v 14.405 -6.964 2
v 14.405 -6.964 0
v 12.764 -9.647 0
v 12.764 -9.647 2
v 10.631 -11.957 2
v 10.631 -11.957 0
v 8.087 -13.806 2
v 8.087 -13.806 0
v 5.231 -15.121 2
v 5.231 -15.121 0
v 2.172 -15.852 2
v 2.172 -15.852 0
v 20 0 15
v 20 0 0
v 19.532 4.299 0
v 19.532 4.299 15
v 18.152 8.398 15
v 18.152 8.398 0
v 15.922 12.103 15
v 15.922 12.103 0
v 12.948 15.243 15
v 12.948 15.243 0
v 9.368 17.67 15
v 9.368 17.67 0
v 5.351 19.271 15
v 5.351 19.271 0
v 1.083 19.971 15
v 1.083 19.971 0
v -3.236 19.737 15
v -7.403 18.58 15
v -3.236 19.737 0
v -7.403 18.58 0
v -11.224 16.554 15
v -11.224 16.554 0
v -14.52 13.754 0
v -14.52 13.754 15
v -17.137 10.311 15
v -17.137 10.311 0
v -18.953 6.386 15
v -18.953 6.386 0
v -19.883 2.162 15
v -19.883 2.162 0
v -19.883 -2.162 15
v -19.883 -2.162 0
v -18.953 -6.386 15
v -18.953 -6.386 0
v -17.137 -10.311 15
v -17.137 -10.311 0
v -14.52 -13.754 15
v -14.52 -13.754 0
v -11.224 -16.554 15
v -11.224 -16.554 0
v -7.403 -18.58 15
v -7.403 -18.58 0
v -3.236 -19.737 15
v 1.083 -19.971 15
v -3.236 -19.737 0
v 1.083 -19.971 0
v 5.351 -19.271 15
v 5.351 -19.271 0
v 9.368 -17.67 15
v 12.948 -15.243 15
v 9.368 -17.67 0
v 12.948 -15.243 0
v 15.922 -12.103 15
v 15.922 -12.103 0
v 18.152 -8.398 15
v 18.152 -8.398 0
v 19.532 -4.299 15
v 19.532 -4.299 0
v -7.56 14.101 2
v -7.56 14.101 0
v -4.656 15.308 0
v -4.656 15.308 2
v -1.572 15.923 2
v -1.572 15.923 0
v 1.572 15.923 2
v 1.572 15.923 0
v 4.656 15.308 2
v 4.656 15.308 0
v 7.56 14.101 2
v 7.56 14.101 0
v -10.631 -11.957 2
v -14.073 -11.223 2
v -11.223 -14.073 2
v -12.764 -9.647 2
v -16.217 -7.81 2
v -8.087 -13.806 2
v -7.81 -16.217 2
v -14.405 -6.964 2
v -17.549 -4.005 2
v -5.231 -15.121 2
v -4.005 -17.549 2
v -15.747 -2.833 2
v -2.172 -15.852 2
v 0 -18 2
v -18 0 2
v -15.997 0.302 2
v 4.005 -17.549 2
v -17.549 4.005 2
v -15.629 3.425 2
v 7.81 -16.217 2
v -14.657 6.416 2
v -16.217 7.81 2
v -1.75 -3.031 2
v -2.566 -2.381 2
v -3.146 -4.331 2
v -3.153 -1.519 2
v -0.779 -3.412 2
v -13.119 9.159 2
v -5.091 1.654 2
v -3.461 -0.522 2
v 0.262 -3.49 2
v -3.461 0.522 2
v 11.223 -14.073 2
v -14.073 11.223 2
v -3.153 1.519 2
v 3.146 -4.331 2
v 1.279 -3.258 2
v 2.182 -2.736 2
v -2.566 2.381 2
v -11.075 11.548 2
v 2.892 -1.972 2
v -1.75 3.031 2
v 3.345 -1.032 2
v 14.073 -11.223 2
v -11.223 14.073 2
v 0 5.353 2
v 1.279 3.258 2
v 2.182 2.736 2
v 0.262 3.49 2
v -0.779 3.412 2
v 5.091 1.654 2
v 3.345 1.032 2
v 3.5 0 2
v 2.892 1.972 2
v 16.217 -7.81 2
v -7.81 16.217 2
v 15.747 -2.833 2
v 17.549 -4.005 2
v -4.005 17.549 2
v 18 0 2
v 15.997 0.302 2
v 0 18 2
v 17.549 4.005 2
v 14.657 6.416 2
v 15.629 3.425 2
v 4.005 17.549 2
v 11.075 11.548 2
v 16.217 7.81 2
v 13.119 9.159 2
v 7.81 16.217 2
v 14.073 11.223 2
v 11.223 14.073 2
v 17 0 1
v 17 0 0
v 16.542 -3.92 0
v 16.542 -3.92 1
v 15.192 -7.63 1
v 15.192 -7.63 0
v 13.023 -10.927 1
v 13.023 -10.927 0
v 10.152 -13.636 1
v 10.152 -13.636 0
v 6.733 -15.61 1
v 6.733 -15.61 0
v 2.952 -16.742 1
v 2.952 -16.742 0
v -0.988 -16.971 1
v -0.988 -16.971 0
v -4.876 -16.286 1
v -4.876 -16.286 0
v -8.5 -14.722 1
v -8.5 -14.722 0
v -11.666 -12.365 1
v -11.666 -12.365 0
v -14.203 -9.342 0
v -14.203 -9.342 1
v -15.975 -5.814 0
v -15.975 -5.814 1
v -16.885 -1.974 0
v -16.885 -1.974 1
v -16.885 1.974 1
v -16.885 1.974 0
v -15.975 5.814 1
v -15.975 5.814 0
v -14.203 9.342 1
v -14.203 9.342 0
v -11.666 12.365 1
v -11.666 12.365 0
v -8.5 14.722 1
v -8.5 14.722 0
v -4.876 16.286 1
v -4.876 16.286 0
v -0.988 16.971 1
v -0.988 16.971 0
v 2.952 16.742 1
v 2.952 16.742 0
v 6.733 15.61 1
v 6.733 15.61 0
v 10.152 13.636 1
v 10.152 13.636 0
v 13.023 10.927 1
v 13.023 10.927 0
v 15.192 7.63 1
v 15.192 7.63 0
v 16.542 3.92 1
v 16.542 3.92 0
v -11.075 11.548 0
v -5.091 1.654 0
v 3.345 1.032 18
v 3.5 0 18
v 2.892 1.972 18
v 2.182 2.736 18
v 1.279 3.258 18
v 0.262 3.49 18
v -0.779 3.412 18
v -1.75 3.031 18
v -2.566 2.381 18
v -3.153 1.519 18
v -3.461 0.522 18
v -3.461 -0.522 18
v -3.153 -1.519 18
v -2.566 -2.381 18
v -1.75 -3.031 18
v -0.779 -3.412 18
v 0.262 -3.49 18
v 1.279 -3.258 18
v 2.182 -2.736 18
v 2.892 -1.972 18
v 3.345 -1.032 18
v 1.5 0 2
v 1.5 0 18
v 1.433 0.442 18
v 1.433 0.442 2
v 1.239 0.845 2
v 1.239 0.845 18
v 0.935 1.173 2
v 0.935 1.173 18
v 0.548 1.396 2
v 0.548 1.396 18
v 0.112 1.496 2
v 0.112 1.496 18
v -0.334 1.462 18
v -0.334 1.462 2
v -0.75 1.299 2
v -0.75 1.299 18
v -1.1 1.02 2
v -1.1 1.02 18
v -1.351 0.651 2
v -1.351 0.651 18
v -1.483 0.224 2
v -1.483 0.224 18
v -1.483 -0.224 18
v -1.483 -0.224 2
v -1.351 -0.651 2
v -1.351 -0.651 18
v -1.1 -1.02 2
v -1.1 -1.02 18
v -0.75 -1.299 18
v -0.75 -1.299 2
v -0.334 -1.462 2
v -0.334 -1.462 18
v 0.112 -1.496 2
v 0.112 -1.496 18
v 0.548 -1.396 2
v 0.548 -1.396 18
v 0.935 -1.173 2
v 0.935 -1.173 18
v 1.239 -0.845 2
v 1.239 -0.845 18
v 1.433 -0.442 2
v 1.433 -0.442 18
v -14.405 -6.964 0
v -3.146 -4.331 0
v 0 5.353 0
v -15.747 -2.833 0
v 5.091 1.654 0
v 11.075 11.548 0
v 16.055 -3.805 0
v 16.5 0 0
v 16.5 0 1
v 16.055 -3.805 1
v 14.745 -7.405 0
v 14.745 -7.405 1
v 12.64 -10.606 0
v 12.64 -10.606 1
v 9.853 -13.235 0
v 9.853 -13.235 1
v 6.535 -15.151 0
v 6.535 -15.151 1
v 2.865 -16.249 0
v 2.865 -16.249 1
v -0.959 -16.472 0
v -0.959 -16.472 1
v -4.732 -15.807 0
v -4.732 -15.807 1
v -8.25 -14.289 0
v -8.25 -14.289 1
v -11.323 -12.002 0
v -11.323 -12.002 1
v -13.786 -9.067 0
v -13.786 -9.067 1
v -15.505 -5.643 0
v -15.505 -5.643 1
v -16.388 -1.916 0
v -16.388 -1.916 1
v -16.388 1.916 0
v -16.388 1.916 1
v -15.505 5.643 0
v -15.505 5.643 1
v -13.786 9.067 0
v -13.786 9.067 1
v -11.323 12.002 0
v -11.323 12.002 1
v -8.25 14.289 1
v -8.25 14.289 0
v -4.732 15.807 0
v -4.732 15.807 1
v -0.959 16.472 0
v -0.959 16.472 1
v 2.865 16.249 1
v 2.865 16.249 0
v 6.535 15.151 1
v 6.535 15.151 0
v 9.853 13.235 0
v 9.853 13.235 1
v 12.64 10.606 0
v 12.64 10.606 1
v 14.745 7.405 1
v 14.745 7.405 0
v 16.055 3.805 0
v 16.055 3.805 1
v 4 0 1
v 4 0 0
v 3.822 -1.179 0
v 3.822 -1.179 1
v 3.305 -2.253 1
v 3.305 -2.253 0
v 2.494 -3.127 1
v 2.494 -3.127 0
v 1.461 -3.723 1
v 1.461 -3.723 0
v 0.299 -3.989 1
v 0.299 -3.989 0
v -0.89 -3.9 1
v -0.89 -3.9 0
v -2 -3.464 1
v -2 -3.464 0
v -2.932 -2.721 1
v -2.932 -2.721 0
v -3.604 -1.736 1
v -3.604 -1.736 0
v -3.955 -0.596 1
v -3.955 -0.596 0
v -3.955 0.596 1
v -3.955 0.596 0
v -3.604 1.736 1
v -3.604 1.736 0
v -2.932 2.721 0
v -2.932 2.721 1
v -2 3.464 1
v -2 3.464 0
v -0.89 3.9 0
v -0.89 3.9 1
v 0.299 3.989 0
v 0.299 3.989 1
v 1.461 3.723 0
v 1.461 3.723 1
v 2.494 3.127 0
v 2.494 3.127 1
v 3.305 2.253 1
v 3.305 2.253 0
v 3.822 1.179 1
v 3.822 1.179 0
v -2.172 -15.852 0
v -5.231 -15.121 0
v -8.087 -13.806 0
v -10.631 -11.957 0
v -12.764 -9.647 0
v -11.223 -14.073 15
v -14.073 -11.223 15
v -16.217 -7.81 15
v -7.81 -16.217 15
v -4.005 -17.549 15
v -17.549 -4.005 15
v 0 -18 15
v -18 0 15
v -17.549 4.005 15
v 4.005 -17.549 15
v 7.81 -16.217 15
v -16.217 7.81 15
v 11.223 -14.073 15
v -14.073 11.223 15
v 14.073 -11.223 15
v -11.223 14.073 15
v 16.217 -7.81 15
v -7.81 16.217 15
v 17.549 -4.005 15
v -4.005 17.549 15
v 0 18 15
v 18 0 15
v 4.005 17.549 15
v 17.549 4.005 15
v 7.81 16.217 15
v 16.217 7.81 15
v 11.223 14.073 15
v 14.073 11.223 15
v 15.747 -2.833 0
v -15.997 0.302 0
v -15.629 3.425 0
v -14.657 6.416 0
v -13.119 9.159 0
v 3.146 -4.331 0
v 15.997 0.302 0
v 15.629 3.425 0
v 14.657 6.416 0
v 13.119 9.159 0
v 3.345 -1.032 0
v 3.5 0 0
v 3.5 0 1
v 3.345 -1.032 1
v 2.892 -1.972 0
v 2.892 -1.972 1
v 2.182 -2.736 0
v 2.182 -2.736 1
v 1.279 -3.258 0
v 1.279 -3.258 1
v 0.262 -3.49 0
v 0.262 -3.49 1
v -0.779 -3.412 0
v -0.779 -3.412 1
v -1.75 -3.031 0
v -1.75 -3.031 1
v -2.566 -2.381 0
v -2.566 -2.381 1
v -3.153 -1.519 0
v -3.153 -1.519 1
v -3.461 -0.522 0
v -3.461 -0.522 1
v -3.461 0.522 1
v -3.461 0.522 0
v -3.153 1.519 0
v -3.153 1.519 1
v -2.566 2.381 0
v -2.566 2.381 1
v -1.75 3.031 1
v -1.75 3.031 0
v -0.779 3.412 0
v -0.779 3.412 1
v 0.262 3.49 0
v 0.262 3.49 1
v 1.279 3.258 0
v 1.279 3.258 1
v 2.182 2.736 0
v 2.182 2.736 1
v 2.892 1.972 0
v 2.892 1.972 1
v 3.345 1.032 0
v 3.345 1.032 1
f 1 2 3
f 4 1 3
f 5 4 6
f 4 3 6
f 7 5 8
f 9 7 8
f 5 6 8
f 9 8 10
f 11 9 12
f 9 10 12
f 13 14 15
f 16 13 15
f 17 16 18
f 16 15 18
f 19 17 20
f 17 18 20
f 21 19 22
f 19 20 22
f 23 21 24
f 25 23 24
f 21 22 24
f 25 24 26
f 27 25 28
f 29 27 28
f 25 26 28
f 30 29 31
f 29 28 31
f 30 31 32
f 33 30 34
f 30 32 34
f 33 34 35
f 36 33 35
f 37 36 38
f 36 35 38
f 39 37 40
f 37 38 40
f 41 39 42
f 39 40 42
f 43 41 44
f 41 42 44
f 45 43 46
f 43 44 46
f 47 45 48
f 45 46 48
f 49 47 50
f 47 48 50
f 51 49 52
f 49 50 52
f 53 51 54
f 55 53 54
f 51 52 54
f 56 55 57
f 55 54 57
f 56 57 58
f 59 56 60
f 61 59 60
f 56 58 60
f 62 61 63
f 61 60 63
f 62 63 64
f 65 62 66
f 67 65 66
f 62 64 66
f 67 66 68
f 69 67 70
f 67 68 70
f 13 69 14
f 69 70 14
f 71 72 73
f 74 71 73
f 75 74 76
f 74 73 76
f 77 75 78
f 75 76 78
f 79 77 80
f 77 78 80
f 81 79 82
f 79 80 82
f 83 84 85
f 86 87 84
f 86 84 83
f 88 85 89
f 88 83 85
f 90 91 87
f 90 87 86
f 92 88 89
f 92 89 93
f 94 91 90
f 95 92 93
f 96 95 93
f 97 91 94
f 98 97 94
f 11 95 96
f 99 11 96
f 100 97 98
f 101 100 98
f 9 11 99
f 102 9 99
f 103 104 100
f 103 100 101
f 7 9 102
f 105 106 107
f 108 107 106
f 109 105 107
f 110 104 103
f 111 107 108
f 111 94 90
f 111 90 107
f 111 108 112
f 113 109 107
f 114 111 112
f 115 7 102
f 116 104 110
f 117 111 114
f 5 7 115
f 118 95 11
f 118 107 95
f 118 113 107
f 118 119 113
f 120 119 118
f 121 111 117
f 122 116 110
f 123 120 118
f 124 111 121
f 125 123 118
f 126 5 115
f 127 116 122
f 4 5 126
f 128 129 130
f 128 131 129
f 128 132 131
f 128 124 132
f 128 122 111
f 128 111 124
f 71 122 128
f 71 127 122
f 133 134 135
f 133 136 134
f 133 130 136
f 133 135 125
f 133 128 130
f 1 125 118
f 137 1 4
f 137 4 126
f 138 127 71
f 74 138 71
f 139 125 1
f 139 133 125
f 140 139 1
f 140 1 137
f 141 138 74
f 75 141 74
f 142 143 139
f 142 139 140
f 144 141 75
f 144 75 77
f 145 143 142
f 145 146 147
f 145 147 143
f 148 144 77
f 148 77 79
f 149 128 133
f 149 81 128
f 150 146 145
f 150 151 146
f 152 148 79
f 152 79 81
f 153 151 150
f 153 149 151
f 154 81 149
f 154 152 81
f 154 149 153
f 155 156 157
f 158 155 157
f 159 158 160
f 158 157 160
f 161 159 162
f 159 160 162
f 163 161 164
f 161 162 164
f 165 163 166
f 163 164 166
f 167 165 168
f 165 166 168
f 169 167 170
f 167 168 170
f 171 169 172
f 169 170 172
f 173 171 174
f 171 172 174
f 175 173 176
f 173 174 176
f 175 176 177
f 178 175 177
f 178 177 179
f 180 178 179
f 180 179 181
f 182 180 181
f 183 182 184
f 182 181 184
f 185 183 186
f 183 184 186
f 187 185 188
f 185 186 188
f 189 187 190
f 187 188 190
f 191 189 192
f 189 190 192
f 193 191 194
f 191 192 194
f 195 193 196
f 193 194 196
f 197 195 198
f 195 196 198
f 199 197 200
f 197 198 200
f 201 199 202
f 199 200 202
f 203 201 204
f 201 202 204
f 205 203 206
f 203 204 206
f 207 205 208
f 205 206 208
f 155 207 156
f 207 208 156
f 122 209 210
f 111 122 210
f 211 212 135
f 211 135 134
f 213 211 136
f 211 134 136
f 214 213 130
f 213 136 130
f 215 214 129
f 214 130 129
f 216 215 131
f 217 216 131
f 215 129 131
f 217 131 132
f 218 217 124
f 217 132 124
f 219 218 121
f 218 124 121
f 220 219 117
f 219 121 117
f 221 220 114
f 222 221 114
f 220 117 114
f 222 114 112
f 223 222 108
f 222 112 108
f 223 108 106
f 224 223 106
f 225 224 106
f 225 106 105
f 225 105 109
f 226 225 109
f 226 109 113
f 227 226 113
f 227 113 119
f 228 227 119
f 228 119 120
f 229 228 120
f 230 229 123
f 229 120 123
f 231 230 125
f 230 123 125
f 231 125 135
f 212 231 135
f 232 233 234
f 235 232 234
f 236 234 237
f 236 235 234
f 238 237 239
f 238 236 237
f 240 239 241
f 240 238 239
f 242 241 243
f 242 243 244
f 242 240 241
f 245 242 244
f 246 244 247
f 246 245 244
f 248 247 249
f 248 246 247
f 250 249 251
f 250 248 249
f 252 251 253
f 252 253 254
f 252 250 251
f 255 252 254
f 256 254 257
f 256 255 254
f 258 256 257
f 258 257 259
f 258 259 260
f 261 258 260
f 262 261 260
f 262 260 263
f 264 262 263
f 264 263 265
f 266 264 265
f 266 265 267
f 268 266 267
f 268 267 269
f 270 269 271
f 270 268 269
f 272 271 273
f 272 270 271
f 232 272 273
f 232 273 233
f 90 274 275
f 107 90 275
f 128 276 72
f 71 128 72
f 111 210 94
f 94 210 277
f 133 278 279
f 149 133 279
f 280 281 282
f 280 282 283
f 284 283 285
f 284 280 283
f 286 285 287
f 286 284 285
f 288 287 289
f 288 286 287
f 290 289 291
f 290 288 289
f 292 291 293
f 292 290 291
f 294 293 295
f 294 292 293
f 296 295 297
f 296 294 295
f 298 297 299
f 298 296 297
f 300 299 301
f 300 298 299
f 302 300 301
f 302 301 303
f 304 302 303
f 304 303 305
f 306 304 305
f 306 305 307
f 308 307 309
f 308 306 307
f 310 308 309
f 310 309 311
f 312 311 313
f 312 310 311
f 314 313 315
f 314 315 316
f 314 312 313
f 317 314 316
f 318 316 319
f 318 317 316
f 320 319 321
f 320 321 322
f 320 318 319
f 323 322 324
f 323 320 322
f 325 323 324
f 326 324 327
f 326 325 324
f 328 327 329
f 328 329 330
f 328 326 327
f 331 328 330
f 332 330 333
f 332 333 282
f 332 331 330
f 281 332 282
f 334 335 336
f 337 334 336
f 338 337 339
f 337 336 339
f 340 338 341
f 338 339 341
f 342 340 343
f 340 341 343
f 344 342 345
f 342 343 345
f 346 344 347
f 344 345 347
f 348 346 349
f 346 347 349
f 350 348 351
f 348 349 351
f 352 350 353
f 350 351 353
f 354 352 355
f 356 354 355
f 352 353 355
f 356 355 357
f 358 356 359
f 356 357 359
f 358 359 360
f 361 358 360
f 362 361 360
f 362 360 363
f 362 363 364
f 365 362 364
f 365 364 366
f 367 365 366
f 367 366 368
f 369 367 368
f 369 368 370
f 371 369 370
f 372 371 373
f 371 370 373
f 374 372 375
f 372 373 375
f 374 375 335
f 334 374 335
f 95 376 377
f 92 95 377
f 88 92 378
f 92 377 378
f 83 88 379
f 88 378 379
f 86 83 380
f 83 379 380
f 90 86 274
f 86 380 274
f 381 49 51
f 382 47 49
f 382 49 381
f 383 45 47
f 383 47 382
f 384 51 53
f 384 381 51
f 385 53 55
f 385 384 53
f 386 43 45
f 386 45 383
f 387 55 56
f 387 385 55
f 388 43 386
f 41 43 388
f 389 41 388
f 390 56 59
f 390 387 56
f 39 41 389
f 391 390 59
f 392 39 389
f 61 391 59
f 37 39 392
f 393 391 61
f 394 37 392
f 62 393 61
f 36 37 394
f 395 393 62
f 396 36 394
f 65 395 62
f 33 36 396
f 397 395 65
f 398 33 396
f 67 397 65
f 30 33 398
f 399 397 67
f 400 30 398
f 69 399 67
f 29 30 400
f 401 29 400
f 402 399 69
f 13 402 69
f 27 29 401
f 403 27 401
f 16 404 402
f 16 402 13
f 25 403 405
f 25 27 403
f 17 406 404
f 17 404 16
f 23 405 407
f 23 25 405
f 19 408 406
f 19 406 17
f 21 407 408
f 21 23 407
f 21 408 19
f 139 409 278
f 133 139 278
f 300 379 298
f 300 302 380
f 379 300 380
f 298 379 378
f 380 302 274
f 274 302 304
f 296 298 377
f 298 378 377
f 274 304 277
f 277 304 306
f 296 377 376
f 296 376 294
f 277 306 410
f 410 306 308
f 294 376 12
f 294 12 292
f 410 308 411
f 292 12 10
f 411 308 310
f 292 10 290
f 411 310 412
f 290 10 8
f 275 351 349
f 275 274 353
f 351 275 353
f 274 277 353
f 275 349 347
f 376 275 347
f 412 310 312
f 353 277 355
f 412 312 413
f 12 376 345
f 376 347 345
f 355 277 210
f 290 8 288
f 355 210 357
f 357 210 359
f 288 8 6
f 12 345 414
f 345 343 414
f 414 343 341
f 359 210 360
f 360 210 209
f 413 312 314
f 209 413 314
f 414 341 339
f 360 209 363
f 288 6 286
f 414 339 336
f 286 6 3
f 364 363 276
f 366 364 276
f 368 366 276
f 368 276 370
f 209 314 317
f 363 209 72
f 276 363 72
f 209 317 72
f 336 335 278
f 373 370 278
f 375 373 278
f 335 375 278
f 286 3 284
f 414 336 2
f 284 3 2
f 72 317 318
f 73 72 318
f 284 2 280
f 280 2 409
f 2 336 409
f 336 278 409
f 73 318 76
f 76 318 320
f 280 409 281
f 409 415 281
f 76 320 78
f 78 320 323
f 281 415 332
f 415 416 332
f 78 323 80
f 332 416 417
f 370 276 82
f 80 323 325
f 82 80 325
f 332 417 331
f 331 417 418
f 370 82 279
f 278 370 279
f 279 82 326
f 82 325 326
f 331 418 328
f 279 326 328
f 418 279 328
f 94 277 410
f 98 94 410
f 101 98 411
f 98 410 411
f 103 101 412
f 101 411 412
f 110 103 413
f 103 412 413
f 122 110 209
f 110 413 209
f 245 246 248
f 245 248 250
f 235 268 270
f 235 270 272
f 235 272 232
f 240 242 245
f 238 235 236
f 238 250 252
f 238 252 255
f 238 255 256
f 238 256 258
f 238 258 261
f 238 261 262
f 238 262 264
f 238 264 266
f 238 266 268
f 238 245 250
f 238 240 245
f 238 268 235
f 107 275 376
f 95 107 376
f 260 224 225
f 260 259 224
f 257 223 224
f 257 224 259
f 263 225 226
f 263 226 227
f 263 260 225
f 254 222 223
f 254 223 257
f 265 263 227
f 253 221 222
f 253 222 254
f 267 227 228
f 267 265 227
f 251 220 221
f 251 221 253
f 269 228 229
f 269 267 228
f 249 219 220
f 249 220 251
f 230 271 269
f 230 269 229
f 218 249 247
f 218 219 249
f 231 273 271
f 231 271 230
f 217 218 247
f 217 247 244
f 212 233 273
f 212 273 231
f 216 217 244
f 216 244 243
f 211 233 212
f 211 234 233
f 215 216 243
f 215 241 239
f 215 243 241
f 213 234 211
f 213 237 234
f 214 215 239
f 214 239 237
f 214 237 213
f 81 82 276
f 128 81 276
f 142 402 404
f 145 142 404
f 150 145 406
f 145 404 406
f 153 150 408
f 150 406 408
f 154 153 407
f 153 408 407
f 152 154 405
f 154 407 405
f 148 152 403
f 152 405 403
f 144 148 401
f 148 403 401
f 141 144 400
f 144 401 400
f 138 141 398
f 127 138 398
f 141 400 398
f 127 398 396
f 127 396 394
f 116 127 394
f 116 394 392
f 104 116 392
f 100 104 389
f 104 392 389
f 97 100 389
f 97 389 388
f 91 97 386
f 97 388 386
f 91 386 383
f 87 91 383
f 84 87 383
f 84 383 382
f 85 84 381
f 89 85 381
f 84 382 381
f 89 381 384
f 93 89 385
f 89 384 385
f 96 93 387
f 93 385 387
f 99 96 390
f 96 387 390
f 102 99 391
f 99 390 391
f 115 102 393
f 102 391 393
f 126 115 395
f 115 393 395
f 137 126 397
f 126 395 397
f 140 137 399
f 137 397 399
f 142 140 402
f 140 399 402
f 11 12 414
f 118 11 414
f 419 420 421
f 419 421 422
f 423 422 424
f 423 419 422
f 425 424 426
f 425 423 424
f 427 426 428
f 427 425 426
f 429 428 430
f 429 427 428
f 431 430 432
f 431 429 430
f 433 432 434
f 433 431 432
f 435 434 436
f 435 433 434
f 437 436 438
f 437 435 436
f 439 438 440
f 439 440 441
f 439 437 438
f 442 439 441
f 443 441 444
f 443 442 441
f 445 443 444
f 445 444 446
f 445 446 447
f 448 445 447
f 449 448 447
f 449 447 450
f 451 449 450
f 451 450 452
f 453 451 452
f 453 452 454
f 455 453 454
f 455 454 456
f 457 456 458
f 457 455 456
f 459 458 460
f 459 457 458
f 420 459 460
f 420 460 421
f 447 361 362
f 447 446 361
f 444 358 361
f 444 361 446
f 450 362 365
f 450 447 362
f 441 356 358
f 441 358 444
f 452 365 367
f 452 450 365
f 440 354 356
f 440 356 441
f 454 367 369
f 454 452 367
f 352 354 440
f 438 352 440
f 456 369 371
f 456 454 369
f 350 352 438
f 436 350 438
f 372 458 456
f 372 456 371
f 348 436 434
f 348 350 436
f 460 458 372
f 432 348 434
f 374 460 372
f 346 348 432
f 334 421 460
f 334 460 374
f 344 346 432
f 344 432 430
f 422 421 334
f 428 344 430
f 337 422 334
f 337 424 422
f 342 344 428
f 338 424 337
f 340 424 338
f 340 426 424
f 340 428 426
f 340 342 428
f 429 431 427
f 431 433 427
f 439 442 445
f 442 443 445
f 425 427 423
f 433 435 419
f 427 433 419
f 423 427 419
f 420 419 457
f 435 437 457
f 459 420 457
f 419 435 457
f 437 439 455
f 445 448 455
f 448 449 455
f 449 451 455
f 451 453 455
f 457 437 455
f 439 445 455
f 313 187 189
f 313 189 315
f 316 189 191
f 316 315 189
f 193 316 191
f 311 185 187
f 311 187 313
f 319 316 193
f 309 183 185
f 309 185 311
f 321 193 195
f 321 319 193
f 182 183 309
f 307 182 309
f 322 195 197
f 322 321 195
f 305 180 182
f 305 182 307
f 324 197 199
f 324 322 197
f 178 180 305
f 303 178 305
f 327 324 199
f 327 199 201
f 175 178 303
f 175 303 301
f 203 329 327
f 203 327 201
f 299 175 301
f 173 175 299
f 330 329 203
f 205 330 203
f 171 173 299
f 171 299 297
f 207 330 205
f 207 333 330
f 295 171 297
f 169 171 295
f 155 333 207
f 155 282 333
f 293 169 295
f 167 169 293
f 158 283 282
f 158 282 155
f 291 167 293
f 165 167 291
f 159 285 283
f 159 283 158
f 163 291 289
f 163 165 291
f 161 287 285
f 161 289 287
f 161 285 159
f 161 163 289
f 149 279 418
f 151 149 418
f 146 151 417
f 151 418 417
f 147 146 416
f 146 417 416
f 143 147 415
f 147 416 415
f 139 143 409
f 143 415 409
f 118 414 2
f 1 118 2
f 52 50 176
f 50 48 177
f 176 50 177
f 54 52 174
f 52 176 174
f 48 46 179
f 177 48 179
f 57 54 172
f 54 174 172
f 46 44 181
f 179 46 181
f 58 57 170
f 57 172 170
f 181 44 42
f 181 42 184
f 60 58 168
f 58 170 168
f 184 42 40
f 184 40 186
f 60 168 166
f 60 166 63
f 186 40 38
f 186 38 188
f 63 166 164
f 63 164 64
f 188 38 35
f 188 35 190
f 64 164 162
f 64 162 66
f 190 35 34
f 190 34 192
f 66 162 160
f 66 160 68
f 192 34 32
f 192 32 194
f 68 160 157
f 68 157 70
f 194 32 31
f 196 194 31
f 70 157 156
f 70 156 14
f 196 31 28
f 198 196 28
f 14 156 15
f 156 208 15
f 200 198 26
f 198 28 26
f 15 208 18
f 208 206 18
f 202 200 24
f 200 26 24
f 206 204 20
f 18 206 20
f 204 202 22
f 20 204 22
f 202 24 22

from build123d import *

# Parameters (mm, degrees)
F0_R      = 20
F1_DEPTH  = 15
F2_R      = 18
F3_DEPTH  = 13
F4_R      = 3.5
F4_R_2    = 1.5
F6_DEPTH  = 16
F7_DEPTH  = 2
F5_R      = 16.5
F5_R_2    = 17
F8_DEPTH  = 1
F9_R      = 4
F9_R_2    = 3.5
F10_DEPTH = 1


with BuildPart() as f1:
    # F0 (on Top) → F1 (new body)
    with BuildSketch(Plane.XY):
        Circle(F0_R)
    extrude(amount=F1_DEPTH)

    # F2 (on face) → F3 (cut)
    with BuildSketch(Plane.XY.offset(15)):
        Circle(F2_R)
    extrude(amount=-F3_DEPTH, mode=Mode.SUBTRACT)

    # F4 (on face) → F6 (join)
    with BuildSketch(Plane.XY.offset(2)):
        Circle(F4_R)
        Circle(F4_R_2, mode=Mode.SUBTRACT)
    extrude(amount=F6_DEPTH)

    # F5 (on face) → F7 (cut)
    with BuildSketch(Plane(origin=(0, 0, 0), x_dir=(1, 0, 0), z_dir=(0, 0, -1))):
        with BuildLine():
            Line((0, -5.352867), (-7.560142, -14.101215))
            ThreePointArc((-7.560142, -14.101215), (0, -16), (7.560142, -14.101215))
            Line((7.560142, -14.101215), (0, -5.352867))
        make_face()
        with BuildLine():
            Line((-5.090879, -1.654127), (-15.747264, 2.832607))
            ThreePointArc((-15.747264, 2.832607), (-15.216904, -4.944272), (-11.07484, -11.547637))
            Line((-11.07484, -11.547637), (-5.090879, -1.654127))
        make_face()
        with BuildLine():
            Line((-3.146336, 4.330561), (-2.172203, 15.851862))
            ThreePointArc((-2.172203, 15.851862), (-9.404564, 12.944272), (-14.404769, 6.964382))
            Line((-14.404769, 6.964382), (-3.146336, 4.330561))
        make_face()
        with BuildLine():
            ThreePointArc((14.404769, 6.964382), (9.404564, 12.944272), (2.172203, 15.851862))
            Line((2.172203, 15.851862), (3.146336, 4.330561))
            Line((3.146336, 4.330561), (14.404769, 6.964382))
        make_face()
        with BuildLine():
            Line((5.090879, -1.654127), (11.07484, -11.547637))
            ThreePointArc((11.07484, -11.547637), (15.216904, -4.944272), (15.747264, 2.832607))
            Line((15.747264, 2.832607), (5.090879, -1.654127))
        make_face()
    extrude(amount=-F7_DEPTH, mode=Mode.SUBTRACT)

    # F5 (on face) → F8 (cut)
    with BuildSketch(Plane(origin=(0, 0, 0), x_dir=(1, 0, 0), z_dir=(0, 0, -1))):
        Circle(F5_R)
        with BuildLine():
            ThreePointArc((-11.07484, -11.547637), (-15.216904, -4.944272), (-15.747264, 2.832607))
            Line((-15.747264, 2.832607), (-5.090879, -1.654127))
            Line((-5.090879, -1.654127), (-11.07484, -11.547637))
        make_face(mode=Mode.SUBTRACT)
        with BuildLine():
            ThreePointArc((7.560142, -14.101215), (0, -16), (-7.560142, -14.101215))
            Line((-7.560142, -14.101215), (0, -5.352867))
            Line((0, -5.352867), (7.560142, -14.101215))
        make_face(mode=Mode.SUBTRACT)
        with BuildLine():
            ThreePointArc((15.747264, 2.832607), (15.216904, -4.944272), (11.07484, -11.547637))
            Line((11.07484, -11.547637), (5.090879, -1.654127))
            Line((5.090879, -1.654127), (15.747264, 2.832607))
        make_face(mode=Mode.SUBTRACT)
        with BuildLine():
            ThreePointArc((-14.404769, 6.964382), (-9.404564, 12.944272), (-2.172203, 15.851862))
            Line((-2.172203, 15.851862), (-3.146336, 4.330561))
            Line((-3.146336, 4.330561), (-14.404769, 6.964382))
        make_face(mode=Mode.SUBTRACT)
        with BuildLine():
            Line((3.146336, 4.330561), (2.172203, 15.851862))
            ThreePointArc((2.172203, 15.851862), (9.404564, 12.944272), (14.404769, 6.964382))
            Line((14.404769, 6.964382), (3.146336, 4.330561))
        make_face(mode=Mode.SUBTRACT)
        Circle(F5_R_2)
        Circle(F5_R, mode=Mode.SUBTRACT)
    extrude(amount=-F8_DEPTH, mode=Mode.SUBTRACT)

    # F9 (on face) → F10 (cut)
    with BuildSketch(Plane(origin=(0, 0, 0), x_dir=(1, 0, 0), z_dir=(0, 0, -1))):
        Circle(F9_R)
        Circle(F9_R_2, mode=Mode.SUBTRACT)
    extrude(amount=-F10_DEPTH, mode=Mode.SUBTRACT)


solid = f1.part
